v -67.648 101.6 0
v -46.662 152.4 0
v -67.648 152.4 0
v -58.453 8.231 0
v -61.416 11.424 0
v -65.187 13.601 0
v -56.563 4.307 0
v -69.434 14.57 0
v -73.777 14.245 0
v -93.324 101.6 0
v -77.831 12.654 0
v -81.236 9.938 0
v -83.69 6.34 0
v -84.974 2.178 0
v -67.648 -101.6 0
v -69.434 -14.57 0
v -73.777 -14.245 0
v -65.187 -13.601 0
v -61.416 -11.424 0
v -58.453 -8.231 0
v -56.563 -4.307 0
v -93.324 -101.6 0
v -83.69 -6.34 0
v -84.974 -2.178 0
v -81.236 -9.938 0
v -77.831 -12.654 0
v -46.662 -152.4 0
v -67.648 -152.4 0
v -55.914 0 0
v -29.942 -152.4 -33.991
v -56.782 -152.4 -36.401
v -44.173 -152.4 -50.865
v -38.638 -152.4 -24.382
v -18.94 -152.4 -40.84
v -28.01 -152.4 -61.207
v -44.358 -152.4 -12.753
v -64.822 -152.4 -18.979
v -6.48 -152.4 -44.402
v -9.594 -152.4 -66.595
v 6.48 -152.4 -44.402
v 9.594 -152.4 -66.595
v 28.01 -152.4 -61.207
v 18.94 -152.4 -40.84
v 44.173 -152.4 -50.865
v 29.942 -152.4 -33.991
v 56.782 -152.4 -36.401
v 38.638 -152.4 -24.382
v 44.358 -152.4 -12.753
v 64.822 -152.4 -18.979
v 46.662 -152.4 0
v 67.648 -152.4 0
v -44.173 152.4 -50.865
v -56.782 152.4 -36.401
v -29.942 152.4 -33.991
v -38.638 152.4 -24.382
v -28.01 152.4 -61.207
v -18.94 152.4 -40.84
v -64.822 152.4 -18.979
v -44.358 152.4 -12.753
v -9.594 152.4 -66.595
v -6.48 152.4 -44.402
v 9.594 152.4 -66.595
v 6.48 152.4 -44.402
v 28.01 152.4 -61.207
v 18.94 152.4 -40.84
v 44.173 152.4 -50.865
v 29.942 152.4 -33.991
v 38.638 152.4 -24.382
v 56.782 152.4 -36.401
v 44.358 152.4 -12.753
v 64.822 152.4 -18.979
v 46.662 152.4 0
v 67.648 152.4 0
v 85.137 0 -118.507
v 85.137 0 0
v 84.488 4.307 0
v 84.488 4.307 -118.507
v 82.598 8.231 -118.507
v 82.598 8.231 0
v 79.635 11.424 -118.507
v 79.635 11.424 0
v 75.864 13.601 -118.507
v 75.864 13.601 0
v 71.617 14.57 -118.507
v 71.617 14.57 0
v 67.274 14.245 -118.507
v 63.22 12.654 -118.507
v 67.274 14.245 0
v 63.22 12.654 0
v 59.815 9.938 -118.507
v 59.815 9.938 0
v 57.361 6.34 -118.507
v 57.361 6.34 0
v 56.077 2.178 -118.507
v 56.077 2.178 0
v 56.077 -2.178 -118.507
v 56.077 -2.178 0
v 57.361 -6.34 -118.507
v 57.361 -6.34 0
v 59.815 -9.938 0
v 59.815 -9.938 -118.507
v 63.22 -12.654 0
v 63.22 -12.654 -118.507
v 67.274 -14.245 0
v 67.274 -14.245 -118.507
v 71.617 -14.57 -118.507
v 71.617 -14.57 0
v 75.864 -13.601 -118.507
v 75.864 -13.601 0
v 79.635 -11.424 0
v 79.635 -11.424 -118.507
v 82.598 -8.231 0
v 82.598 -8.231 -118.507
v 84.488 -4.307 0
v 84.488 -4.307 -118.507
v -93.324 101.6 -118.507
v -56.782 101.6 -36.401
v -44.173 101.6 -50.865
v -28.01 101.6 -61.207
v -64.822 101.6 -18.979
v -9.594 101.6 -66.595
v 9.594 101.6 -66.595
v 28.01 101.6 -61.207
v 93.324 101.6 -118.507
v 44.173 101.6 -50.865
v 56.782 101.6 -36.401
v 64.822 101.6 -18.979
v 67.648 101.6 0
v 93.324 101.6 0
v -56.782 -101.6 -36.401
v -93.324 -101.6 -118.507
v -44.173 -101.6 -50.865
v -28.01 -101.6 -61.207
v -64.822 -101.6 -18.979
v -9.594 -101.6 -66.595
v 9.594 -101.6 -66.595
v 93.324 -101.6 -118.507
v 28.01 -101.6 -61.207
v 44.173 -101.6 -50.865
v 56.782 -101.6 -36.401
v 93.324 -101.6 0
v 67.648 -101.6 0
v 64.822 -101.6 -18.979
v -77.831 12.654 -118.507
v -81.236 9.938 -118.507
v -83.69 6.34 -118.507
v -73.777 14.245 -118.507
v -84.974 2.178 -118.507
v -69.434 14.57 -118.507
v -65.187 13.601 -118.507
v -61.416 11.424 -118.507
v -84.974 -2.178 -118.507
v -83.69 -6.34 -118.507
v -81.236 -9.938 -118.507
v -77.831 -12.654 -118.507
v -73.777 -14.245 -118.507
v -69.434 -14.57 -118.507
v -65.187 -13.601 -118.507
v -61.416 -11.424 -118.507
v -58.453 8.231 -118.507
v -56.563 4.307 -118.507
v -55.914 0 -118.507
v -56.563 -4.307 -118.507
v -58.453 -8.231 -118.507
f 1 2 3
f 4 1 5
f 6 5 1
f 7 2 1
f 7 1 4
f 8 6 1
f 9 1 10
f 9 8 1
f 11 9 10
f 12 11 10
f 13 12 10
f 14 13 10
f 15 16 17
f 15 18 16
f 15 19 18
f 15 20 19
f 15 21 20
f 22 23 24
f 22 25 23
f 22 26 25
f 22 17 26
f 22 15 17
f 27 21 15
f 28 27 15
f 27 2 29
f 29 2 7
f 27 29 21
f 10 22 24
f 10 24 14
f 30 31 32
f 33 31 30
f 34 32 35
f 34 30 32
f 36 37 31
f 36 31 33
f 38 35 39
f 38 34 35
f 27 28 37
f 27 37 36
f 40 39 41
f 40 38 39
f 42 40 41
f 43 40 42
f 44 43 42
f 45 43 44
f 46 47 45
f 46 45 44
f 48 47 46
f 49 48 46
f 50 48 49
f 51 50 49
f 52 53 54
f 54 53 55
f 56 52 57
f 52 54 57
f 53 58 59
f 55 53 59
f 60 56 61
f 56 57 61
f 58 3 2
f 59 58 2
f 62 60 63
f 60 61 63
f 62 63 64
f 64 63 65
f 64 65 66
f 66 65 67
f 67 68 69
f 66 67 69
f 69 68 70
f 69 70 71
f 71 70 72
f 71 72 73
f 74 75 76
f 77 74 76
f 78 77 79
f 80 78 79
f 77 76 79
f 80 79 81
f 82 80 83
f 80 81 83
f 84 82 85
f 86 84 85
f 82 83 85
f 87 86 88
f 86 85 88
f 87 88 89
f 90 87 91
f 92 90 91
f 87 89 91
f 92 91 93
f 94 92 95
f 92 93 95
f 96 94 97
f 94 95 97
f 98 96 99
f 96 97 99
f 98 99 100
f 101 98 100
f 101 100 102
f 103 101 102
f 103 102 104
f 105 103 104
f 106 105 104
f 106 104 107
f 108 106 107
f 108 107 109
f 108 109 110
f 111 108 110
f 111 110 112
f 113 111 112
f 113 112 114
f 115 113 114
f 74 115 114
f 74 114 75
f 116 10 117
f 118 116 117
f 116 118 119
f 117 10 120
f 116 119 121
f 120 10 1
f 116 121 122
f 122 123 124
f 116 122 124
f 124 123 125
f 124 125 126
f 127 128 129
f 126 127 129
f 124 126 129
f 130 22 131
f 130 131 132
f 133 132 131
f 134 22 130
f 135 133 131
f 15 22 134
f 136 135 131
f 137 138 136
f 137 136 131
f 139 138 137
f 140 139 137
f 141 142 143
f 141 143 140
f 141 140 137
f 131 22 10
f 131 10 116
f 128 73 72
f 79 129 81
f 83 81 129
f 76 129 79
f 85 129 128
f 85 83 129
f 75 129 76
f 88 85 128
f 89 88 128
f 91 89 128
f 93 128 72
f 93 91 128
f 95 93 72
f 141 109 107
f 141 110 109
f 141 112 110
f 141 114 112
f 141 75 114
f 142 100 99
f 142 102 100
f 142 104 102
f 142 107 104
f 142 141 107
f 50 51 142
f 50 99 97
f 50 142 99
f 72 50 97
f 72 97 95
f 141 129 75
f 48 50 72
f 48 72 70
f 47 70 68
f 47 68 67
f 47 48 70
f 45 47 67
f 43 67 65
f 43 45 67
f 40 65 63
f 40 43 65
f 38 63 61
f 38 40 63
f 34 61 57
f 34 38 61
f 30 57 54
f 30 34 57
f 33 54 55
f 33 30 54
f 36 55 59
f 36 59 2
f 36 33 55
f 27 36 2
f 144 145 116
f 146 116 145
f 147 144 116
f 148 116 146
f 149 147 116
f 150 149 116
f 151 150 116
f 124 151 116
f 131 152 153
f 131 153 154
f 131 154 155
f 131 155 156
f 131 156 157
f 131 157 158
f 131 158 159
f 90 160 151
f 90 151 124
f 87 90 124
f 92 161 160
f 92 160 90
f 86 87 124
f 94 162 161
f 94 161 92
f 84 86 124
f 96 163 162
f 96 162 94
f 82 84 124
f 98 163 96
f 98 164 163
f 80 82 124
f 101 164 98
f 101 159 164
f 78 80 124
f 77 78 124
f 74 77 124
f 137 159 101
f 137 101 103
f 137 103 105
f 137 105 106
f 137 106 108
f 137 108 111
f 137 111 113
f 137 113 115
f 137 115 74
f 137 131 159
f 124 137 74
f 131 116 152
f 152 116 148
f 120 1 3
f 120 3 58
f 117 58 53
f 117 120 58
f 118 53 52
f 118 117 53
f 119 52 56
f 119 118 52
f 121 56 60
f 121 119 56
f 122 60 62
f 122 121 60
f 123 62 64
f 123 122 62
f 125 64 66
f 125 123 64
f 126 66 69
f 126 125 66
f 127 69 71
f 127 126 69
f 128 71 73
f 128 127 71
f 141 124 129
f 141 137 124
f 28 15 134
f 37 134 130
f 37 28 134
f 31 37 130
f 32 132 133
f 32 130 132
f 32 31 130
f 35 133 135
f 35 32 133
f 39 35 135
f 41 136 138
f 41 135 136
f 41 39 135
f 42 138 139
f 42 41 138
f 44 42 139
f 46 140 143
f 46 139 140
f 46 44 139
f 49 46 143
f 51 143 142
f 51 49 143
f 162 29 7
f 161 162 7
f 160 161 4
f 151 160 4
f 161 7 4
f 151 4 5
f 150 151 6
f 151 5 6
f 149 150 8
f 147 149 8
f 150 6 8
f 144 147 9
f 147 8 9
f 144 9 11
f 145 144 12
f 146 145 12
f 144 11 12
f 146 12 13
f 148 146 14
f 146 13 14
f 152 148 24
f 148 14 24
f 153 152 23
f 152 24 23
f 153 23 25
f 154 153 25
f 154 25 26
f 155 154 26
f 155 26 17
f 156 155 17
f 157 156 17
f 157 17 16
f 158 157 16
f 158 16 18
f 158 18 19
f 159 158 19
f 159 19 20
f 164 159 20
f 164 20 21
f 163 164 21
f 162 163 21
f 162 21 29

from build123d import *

# Parameters (mm, degrees)
F1_DEPTH = 152.4
F2_DEPTH = 101.6
F3_R     = 14.611246
F4_DEPTH = 161.29


with BuildPart() as f1:
    # F0 (on Front) → F1 (new body, symmetric)
    with BuildSketch(Plane.XZ):
        with BuildLine():
            Line((67.64774, 0), (46.662122, 0))
            ThreePointArc((46.662122, 0), (0, -44.853662), (-46.662122, 0))
            Line((-46.662122, 0), (-67.64774, 0))
            ThreePointArc((-67.64774, 0), (0, -67.278411), (67.64774, 0))
        make_face()
    extrude(amount=F1_DEPTH, both=True)

    # F0 (on Front) → F2 (join, symmetric)
    with BuildSketch(Plane.XZ):
        with BuildLine():
            Line((93.324244, 0), (67.64774, 0))
            ThreePointArc((67.64774, 0), (0, -67.278411), (-67.64774, 0))
            Line((-67.64774, 0), (-93.324244, 0))
            Line((-93.324244, 0), (-93.324244, -118.506968))
            Line((-93.324244, -118.506968), (0, -118.506968))
            Line((0, -118.506968), (93.324244, -118.506968))
            Line((93.324244, -118.506968), (93.324244, 0))
        make_face()
    extrude(amount=F2_DEPTH, both=True)

    # F3 (on Top) → F4 (cut)
    with BuildSketch(Plane.XY):
        with Locations((-70.525467, 0)):
            Circle(F3_R)
        with Locations((70.525467, 0)):
            Circle(F3_R)
    extrude(amount=-F4_DEPTH, mode=Mode.SUBTRACT)


solid = f1.part
